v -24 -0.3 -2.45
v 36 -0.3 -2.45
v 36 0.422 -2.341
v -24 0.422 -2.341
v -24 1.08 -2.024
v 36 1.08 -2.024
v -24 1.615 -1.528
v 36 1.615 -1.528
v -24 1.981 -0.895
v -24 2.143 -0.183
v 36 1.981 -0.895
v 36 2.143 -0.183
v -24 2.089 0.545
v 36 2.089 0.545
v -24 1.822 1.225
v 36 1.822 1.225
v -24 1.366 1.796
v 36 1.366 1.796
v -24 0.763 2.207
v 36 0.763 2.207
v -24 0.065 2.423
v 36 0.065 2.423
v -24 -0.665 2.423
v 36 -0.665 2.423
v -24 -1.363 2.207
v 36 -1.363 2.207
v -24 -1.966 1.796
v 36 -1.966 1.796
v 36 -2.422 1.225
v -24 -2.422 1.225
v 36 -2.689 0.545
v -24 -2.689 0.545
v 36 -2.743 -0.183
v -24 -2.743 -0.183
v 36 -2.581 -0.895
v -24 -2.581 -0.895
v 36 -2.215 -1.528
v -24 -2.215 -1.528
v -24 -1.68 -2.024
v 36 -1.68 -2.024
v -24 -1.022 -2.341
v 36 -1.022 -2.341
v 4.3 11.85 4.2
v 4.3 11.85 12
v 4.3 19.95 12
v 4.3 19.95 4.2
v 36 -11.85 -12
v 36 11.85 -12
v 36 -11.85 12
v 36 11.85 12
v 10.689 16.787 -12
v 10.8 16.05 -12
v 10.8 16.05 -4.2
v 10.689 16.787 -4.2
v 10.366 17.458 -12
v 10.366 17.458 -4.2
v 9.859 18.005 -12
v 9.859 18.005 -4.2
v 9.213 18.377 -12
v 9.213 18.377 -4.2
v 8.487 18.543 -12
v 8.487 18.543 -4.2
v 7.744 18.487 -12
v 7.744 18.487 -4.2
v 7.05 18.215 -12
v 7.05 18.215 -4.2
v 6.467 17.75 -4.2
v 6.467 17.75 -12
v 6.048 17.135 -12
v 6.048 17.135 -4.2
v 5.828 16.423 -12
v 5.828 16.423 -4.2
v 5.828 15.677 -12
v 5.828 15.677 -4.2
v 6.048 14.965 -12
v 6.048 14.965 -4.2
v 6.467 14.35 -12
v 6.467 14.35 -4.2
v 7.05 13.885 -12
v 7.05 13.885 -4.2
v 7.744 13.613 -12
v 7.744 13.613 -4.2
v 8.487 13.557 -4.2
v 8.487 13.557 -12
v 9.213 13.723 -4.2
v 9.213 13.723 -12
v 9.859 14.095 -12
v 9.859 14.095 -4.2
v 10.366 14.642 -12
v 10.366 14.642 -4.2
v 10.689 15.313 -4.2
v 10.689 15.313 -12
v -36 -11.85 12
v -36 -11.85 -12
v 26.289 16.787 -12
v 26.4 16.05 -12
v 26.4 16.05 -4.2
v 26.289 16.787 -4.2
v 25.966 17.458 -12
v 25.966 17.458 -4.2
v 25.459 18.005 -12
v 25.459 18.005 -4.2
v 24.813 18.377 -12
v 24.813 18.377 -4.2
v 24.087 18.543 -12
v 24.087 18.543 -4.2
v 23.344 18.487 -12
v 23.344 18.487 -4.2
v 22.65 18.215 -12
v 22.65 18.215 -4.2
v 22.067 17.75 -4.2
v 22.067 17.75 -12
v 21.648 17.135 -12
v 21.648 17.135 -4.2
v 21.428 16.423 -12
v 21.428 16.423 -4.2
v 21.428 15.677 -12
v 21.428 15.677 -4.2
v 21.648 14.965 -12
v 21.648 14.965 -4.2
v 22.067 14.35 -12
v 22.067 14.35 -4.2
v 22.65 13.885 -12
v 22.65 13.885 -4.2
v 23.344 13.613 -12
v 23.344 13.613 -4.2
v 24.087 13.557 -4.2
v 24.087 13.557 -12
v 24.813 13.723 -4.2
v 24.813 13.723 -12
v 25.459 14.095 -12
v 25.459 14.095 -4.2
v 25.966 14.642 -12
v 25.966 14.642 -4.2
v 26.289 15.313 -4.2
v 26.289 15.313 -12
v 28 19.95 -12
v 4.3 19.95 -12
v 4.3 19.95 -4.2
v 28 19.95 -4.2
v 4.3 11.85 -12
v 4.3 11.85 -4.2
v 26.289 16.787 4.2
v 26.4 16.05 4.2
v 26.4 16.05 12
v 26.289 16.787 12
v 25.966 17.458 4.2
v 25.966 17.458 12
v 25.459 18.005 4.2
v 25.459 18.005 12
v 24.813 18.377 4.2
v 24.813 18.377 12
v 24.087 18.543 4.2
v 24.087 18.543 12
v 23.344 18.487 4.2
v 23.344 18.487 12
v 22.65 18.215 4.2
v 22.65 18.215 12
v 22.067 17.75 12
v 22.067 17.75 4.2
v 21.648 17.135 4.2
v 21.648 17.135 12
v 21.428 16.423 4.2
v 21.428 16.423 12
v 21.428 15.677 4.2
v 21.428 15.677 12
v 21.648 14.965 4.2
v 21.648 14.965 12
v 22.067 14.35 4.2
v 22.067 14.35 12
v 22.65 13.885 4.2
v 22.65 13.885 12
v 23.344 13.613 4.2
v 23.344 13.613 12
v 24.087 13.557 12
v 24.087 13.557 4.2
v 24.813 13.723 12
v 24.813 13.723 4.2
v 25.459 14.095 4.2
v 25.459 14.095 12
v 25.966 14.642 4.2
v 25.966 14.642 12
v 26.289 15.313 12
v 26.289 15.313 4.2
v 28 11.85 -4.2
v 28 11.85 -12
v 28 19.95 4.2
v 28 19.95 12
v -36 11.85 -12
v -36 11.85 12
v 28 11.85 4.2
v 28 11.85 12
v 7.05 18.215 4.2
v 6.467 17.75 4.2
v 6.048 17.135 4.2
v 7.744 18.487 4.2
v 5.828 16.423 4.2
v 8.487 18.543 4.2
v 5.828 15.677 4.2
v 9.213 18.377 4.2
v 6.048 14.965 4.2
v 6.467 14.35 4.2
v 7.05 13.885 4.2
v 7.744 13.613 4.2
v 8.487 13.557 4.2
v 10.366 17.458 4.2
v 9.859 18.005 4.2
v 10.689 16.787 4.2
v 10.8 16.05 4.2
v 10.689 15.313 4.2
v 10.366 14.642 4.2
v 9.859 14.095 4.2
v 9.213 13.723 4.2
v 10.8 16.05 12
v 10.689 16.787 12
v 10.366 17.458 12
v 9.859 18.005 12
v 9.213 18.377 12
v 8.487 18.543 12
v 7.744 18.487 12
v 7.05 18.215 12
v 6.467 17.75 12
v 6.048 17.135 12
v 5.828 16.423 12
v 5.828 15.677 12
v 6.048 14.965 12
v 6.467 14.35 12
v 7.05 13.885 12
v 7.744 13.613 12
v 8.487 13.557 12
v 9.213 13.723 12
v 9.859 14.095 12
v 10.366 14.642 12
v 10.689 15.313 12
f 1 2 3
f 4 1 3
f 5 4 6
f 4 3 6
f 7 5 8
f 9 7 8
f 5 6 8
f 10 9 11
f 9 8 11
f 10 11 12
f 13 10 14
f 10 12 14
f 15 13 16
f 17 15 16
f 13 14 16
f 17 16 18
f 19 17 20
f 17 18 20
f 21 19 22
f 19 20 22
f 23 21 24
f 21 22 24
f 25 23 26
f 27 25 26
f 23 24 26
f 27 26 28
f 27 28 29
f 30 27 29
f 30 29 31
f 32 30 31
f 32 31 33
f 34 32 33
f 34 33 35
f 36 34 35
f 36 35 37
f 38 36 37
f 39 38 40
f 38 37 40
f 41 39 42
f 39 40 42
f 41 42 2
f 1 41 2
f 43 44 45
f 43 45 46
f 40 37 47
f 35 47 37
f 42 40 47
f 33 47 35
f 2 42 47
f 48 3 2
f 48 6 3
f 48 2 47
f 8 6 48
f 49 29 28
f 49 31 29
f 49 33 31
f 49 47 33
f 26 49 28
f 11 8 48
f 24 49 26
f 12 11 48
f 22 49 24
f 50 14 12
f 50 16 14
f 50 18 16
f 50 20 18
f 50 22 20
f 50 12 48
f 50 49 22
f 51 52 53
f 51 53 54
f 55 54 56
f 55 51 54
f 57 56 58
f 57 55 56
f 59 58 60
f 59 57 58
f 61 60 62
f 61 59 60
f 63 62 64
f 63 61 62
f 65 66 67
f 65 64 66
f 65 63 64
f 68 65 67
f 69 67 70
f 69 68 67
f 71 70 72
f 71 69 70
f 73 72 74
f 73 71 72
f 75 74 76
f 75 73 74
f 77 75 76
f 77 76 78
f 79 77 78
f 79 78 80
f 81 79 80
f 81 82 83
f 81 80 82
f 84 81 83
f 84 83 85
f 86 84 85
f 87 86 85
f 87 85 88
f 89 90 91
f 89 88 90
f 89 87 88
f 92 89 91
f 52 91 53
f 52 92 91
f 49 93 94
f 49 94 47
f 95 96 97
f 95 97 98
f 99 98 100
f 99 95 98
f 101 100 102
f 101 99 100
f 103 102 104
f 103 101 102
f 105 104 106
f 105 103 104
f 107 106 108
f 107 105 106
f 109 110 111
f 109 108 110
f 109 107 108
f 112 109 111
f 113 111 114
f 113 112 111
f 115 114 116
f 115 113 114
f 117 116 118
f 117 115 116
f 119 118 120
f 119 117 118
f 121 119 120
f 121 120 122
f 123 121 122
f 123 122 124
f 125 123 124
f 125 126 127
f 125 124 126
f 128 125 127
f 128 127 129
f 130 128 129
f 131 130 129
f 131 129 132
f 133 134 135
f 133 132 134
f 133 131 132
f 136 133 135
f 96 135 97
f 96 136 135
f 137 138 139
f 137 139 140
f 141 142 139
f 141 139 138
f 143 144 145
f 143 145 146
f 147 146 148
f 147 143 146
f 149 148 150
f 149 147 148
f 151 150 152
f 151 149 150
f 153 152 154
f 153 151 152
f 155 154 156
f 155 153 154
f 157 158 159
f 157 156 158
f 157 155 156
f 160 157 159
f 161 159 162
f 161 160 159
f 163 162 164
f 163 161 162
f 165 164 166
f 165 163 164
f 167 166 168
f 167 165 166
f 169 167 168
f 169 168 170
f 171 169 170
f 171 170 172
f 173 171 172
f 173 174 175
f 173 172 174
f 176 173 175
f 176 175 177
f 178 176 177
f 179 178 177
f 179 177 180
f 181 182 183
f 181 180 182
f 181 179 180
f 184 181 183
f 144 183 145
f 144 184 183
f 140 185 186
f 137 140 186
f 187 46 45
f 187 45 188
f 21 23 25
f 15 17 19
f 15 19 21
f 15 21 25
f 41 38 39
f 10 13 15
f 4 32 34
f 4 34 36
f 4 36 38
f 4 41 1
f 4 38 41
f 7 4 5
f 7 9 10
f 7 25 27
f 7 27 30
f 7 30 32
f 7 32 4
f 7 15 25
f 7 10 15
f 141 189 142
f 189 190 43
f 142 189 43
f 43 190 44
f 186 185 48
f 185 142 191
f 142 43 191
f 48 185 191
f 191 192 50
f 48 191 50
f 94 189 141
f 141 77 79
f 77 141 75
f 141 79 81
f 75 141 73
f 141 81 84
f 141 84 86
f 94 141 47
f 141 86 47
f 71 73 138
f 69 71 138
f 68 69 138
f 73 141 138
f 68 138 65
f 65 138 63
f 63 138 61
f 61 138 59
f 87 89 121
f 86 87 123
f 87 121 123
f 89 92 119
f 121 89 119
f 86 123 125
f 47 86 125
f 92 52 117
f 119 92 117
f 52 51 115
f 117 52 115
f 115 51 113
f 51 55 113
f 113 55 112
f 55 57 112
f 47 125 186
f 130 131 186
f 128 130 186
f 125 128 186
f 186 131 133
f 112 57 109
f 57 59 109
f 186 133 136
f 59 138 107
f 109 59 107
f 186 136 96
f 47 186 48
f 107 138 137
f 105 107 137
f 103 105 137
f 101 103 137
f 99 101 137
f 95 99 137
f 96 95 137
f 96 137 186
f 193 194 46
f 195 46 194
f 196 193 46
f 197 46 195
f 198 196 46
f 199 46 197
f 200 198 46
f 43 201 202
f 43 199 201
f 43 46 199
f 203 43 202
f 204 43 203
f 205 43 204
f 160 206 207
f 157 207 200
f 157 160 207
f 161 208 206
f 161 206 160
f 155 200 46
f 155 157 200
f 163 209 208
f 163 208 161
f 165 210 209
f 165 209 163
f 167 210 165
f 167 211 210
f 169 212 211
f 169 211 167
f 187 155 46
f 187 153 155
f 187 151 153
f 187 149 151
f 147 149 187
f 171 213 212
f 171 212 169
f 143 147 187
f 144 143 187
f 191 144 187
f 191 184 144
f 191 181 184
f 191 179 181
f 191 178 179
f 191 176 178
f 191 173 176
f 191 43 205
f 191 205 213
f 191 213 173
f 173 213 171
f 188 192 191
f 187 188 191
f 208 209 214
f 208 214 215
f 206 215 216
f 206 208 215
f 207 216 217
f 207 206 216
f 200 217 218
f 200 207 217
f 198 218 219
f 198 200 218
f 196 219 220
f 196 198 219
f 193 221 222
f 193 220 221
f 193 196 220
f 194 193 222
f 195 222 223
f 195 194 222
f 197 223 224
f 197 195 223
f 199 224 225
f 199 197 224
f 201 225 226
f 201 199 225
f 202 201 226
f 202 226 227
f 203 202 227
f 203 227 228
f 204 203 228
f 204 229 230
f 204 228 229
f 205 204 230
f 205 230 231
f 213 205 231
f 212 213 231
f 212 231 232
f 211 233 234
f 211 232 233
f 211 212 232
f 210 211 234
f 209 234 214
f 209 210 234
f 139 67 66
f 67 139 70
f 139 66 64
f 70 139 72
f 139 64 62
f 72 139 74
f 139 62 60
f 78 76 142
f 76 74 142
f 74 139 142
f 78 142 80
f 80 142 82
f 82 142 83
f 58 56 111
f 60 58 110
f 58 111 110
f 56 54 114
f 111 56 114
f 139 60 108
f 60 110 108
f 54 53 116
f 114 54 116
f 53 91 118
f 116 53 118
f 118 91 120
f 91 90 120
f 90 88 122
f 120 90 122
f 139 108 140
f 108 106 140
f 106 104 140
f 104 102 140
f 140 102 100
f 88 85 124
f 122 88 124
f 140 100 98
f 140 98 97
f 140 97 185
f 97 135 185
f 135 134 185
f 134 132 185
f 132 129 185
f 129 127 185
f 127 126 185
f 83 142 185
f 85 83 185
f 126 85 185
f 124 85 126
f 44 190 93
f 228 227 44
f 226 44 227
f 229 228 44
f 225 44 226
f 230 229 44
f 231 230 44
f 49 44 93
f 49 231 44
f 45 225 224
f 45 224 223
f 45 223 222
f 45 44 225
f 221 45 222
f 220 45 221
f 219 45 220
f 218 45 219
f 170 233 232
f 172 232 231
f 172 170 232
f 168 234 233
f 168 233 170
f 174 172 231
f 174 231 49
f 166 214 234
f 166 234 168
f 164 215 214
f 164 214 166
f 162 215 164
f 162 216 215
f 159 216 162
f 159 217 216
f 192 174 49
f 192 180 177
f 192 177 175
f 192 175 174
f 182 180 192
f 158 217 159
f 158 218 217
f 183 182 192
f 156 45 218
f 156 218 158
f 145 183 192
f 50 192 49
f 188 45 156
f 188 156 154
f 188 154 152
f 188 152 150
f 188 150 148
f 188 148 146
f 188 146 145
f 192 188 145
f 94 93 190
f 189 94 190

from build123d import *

# Parameters (mm, degrees)
SKETCH1_W               = 72
SKETCH1_H               = 23.7
BOSS_EXTRUDE1_DEPTH     = 12
SKETCH3_W               = 23.7
SKETCH3_H               = 7.8
BOSS_EXTRUDE2_DEPTH     = 8.1
SKETCH2_R               = 2.45
CUT_EXTRUDE1_DEPTH      = 60
CUT_EXTRUDE2_DEPTH      = 43.871931377
CUT_EXTRUDE2_DEPTH_BACK = 43.871931377
SKETCH4_R               = 2.5


with BuildPart() as part:
    # Sketch1 → Boss-Extrude1 (new, symmetric)
    with BuildSketch(Plane.XY):
        Rectangle(SKETCH1_W, SKETCH1_H)
    extrude(amount=BOSS_EXTRUDE1_DEPTH, both=True)

    # Sketch3 → Boss-Extrude2 (add)
    with BuildSketch(Plane(origin=(0, 11.85, 0), x_dir=(1, 0, 0), z_dir=(0, 1, 0))):
        with Locations((16.15, -8.1)):
            Rectangle(SKETCH3_W, SKETCH3_H)
        with Locations((16.15, 8.1)):
            Rectangle(SKETCH3_W, SKETCH3_H)
    extrude(amount=BOSS_EXTRUDE2_DEPTH)

    # Sketch2 → Cut-Extrude1 (cut)
    with BuildSketch(Plane(origin=(36, 0, 0), x_dir=(0, 0, -1), z_dir=(1, 0, 0))):
        with Locations((0, -0.3)):
            Circle(SKETCH2_R)
    extrude(amount=-CUT_EXTRUDE1_DEPTH, mode=Mode.SUBTRACT)

    # Sketch4 → Cut-Extrude2 (cut, two sides: drawn at the far end of the back side and taken through both)
    with BuildSketch(Plane.XY.offset(-CUT_EXTRUDE2_DEPTH_BACK)):
        with Locations((8.3, 16.05)):
            Circle(SKETCH4_R)
        with Locations((23.9, 16.05)):
            Circle(SKETCH4_R)
    extrude(amount=CUT_EXTRUDE2_DEPTH + CUT_EXTRUDE2_DEPTH_BACK, mode=Mode.SUBTRACT)


solid = part.part
